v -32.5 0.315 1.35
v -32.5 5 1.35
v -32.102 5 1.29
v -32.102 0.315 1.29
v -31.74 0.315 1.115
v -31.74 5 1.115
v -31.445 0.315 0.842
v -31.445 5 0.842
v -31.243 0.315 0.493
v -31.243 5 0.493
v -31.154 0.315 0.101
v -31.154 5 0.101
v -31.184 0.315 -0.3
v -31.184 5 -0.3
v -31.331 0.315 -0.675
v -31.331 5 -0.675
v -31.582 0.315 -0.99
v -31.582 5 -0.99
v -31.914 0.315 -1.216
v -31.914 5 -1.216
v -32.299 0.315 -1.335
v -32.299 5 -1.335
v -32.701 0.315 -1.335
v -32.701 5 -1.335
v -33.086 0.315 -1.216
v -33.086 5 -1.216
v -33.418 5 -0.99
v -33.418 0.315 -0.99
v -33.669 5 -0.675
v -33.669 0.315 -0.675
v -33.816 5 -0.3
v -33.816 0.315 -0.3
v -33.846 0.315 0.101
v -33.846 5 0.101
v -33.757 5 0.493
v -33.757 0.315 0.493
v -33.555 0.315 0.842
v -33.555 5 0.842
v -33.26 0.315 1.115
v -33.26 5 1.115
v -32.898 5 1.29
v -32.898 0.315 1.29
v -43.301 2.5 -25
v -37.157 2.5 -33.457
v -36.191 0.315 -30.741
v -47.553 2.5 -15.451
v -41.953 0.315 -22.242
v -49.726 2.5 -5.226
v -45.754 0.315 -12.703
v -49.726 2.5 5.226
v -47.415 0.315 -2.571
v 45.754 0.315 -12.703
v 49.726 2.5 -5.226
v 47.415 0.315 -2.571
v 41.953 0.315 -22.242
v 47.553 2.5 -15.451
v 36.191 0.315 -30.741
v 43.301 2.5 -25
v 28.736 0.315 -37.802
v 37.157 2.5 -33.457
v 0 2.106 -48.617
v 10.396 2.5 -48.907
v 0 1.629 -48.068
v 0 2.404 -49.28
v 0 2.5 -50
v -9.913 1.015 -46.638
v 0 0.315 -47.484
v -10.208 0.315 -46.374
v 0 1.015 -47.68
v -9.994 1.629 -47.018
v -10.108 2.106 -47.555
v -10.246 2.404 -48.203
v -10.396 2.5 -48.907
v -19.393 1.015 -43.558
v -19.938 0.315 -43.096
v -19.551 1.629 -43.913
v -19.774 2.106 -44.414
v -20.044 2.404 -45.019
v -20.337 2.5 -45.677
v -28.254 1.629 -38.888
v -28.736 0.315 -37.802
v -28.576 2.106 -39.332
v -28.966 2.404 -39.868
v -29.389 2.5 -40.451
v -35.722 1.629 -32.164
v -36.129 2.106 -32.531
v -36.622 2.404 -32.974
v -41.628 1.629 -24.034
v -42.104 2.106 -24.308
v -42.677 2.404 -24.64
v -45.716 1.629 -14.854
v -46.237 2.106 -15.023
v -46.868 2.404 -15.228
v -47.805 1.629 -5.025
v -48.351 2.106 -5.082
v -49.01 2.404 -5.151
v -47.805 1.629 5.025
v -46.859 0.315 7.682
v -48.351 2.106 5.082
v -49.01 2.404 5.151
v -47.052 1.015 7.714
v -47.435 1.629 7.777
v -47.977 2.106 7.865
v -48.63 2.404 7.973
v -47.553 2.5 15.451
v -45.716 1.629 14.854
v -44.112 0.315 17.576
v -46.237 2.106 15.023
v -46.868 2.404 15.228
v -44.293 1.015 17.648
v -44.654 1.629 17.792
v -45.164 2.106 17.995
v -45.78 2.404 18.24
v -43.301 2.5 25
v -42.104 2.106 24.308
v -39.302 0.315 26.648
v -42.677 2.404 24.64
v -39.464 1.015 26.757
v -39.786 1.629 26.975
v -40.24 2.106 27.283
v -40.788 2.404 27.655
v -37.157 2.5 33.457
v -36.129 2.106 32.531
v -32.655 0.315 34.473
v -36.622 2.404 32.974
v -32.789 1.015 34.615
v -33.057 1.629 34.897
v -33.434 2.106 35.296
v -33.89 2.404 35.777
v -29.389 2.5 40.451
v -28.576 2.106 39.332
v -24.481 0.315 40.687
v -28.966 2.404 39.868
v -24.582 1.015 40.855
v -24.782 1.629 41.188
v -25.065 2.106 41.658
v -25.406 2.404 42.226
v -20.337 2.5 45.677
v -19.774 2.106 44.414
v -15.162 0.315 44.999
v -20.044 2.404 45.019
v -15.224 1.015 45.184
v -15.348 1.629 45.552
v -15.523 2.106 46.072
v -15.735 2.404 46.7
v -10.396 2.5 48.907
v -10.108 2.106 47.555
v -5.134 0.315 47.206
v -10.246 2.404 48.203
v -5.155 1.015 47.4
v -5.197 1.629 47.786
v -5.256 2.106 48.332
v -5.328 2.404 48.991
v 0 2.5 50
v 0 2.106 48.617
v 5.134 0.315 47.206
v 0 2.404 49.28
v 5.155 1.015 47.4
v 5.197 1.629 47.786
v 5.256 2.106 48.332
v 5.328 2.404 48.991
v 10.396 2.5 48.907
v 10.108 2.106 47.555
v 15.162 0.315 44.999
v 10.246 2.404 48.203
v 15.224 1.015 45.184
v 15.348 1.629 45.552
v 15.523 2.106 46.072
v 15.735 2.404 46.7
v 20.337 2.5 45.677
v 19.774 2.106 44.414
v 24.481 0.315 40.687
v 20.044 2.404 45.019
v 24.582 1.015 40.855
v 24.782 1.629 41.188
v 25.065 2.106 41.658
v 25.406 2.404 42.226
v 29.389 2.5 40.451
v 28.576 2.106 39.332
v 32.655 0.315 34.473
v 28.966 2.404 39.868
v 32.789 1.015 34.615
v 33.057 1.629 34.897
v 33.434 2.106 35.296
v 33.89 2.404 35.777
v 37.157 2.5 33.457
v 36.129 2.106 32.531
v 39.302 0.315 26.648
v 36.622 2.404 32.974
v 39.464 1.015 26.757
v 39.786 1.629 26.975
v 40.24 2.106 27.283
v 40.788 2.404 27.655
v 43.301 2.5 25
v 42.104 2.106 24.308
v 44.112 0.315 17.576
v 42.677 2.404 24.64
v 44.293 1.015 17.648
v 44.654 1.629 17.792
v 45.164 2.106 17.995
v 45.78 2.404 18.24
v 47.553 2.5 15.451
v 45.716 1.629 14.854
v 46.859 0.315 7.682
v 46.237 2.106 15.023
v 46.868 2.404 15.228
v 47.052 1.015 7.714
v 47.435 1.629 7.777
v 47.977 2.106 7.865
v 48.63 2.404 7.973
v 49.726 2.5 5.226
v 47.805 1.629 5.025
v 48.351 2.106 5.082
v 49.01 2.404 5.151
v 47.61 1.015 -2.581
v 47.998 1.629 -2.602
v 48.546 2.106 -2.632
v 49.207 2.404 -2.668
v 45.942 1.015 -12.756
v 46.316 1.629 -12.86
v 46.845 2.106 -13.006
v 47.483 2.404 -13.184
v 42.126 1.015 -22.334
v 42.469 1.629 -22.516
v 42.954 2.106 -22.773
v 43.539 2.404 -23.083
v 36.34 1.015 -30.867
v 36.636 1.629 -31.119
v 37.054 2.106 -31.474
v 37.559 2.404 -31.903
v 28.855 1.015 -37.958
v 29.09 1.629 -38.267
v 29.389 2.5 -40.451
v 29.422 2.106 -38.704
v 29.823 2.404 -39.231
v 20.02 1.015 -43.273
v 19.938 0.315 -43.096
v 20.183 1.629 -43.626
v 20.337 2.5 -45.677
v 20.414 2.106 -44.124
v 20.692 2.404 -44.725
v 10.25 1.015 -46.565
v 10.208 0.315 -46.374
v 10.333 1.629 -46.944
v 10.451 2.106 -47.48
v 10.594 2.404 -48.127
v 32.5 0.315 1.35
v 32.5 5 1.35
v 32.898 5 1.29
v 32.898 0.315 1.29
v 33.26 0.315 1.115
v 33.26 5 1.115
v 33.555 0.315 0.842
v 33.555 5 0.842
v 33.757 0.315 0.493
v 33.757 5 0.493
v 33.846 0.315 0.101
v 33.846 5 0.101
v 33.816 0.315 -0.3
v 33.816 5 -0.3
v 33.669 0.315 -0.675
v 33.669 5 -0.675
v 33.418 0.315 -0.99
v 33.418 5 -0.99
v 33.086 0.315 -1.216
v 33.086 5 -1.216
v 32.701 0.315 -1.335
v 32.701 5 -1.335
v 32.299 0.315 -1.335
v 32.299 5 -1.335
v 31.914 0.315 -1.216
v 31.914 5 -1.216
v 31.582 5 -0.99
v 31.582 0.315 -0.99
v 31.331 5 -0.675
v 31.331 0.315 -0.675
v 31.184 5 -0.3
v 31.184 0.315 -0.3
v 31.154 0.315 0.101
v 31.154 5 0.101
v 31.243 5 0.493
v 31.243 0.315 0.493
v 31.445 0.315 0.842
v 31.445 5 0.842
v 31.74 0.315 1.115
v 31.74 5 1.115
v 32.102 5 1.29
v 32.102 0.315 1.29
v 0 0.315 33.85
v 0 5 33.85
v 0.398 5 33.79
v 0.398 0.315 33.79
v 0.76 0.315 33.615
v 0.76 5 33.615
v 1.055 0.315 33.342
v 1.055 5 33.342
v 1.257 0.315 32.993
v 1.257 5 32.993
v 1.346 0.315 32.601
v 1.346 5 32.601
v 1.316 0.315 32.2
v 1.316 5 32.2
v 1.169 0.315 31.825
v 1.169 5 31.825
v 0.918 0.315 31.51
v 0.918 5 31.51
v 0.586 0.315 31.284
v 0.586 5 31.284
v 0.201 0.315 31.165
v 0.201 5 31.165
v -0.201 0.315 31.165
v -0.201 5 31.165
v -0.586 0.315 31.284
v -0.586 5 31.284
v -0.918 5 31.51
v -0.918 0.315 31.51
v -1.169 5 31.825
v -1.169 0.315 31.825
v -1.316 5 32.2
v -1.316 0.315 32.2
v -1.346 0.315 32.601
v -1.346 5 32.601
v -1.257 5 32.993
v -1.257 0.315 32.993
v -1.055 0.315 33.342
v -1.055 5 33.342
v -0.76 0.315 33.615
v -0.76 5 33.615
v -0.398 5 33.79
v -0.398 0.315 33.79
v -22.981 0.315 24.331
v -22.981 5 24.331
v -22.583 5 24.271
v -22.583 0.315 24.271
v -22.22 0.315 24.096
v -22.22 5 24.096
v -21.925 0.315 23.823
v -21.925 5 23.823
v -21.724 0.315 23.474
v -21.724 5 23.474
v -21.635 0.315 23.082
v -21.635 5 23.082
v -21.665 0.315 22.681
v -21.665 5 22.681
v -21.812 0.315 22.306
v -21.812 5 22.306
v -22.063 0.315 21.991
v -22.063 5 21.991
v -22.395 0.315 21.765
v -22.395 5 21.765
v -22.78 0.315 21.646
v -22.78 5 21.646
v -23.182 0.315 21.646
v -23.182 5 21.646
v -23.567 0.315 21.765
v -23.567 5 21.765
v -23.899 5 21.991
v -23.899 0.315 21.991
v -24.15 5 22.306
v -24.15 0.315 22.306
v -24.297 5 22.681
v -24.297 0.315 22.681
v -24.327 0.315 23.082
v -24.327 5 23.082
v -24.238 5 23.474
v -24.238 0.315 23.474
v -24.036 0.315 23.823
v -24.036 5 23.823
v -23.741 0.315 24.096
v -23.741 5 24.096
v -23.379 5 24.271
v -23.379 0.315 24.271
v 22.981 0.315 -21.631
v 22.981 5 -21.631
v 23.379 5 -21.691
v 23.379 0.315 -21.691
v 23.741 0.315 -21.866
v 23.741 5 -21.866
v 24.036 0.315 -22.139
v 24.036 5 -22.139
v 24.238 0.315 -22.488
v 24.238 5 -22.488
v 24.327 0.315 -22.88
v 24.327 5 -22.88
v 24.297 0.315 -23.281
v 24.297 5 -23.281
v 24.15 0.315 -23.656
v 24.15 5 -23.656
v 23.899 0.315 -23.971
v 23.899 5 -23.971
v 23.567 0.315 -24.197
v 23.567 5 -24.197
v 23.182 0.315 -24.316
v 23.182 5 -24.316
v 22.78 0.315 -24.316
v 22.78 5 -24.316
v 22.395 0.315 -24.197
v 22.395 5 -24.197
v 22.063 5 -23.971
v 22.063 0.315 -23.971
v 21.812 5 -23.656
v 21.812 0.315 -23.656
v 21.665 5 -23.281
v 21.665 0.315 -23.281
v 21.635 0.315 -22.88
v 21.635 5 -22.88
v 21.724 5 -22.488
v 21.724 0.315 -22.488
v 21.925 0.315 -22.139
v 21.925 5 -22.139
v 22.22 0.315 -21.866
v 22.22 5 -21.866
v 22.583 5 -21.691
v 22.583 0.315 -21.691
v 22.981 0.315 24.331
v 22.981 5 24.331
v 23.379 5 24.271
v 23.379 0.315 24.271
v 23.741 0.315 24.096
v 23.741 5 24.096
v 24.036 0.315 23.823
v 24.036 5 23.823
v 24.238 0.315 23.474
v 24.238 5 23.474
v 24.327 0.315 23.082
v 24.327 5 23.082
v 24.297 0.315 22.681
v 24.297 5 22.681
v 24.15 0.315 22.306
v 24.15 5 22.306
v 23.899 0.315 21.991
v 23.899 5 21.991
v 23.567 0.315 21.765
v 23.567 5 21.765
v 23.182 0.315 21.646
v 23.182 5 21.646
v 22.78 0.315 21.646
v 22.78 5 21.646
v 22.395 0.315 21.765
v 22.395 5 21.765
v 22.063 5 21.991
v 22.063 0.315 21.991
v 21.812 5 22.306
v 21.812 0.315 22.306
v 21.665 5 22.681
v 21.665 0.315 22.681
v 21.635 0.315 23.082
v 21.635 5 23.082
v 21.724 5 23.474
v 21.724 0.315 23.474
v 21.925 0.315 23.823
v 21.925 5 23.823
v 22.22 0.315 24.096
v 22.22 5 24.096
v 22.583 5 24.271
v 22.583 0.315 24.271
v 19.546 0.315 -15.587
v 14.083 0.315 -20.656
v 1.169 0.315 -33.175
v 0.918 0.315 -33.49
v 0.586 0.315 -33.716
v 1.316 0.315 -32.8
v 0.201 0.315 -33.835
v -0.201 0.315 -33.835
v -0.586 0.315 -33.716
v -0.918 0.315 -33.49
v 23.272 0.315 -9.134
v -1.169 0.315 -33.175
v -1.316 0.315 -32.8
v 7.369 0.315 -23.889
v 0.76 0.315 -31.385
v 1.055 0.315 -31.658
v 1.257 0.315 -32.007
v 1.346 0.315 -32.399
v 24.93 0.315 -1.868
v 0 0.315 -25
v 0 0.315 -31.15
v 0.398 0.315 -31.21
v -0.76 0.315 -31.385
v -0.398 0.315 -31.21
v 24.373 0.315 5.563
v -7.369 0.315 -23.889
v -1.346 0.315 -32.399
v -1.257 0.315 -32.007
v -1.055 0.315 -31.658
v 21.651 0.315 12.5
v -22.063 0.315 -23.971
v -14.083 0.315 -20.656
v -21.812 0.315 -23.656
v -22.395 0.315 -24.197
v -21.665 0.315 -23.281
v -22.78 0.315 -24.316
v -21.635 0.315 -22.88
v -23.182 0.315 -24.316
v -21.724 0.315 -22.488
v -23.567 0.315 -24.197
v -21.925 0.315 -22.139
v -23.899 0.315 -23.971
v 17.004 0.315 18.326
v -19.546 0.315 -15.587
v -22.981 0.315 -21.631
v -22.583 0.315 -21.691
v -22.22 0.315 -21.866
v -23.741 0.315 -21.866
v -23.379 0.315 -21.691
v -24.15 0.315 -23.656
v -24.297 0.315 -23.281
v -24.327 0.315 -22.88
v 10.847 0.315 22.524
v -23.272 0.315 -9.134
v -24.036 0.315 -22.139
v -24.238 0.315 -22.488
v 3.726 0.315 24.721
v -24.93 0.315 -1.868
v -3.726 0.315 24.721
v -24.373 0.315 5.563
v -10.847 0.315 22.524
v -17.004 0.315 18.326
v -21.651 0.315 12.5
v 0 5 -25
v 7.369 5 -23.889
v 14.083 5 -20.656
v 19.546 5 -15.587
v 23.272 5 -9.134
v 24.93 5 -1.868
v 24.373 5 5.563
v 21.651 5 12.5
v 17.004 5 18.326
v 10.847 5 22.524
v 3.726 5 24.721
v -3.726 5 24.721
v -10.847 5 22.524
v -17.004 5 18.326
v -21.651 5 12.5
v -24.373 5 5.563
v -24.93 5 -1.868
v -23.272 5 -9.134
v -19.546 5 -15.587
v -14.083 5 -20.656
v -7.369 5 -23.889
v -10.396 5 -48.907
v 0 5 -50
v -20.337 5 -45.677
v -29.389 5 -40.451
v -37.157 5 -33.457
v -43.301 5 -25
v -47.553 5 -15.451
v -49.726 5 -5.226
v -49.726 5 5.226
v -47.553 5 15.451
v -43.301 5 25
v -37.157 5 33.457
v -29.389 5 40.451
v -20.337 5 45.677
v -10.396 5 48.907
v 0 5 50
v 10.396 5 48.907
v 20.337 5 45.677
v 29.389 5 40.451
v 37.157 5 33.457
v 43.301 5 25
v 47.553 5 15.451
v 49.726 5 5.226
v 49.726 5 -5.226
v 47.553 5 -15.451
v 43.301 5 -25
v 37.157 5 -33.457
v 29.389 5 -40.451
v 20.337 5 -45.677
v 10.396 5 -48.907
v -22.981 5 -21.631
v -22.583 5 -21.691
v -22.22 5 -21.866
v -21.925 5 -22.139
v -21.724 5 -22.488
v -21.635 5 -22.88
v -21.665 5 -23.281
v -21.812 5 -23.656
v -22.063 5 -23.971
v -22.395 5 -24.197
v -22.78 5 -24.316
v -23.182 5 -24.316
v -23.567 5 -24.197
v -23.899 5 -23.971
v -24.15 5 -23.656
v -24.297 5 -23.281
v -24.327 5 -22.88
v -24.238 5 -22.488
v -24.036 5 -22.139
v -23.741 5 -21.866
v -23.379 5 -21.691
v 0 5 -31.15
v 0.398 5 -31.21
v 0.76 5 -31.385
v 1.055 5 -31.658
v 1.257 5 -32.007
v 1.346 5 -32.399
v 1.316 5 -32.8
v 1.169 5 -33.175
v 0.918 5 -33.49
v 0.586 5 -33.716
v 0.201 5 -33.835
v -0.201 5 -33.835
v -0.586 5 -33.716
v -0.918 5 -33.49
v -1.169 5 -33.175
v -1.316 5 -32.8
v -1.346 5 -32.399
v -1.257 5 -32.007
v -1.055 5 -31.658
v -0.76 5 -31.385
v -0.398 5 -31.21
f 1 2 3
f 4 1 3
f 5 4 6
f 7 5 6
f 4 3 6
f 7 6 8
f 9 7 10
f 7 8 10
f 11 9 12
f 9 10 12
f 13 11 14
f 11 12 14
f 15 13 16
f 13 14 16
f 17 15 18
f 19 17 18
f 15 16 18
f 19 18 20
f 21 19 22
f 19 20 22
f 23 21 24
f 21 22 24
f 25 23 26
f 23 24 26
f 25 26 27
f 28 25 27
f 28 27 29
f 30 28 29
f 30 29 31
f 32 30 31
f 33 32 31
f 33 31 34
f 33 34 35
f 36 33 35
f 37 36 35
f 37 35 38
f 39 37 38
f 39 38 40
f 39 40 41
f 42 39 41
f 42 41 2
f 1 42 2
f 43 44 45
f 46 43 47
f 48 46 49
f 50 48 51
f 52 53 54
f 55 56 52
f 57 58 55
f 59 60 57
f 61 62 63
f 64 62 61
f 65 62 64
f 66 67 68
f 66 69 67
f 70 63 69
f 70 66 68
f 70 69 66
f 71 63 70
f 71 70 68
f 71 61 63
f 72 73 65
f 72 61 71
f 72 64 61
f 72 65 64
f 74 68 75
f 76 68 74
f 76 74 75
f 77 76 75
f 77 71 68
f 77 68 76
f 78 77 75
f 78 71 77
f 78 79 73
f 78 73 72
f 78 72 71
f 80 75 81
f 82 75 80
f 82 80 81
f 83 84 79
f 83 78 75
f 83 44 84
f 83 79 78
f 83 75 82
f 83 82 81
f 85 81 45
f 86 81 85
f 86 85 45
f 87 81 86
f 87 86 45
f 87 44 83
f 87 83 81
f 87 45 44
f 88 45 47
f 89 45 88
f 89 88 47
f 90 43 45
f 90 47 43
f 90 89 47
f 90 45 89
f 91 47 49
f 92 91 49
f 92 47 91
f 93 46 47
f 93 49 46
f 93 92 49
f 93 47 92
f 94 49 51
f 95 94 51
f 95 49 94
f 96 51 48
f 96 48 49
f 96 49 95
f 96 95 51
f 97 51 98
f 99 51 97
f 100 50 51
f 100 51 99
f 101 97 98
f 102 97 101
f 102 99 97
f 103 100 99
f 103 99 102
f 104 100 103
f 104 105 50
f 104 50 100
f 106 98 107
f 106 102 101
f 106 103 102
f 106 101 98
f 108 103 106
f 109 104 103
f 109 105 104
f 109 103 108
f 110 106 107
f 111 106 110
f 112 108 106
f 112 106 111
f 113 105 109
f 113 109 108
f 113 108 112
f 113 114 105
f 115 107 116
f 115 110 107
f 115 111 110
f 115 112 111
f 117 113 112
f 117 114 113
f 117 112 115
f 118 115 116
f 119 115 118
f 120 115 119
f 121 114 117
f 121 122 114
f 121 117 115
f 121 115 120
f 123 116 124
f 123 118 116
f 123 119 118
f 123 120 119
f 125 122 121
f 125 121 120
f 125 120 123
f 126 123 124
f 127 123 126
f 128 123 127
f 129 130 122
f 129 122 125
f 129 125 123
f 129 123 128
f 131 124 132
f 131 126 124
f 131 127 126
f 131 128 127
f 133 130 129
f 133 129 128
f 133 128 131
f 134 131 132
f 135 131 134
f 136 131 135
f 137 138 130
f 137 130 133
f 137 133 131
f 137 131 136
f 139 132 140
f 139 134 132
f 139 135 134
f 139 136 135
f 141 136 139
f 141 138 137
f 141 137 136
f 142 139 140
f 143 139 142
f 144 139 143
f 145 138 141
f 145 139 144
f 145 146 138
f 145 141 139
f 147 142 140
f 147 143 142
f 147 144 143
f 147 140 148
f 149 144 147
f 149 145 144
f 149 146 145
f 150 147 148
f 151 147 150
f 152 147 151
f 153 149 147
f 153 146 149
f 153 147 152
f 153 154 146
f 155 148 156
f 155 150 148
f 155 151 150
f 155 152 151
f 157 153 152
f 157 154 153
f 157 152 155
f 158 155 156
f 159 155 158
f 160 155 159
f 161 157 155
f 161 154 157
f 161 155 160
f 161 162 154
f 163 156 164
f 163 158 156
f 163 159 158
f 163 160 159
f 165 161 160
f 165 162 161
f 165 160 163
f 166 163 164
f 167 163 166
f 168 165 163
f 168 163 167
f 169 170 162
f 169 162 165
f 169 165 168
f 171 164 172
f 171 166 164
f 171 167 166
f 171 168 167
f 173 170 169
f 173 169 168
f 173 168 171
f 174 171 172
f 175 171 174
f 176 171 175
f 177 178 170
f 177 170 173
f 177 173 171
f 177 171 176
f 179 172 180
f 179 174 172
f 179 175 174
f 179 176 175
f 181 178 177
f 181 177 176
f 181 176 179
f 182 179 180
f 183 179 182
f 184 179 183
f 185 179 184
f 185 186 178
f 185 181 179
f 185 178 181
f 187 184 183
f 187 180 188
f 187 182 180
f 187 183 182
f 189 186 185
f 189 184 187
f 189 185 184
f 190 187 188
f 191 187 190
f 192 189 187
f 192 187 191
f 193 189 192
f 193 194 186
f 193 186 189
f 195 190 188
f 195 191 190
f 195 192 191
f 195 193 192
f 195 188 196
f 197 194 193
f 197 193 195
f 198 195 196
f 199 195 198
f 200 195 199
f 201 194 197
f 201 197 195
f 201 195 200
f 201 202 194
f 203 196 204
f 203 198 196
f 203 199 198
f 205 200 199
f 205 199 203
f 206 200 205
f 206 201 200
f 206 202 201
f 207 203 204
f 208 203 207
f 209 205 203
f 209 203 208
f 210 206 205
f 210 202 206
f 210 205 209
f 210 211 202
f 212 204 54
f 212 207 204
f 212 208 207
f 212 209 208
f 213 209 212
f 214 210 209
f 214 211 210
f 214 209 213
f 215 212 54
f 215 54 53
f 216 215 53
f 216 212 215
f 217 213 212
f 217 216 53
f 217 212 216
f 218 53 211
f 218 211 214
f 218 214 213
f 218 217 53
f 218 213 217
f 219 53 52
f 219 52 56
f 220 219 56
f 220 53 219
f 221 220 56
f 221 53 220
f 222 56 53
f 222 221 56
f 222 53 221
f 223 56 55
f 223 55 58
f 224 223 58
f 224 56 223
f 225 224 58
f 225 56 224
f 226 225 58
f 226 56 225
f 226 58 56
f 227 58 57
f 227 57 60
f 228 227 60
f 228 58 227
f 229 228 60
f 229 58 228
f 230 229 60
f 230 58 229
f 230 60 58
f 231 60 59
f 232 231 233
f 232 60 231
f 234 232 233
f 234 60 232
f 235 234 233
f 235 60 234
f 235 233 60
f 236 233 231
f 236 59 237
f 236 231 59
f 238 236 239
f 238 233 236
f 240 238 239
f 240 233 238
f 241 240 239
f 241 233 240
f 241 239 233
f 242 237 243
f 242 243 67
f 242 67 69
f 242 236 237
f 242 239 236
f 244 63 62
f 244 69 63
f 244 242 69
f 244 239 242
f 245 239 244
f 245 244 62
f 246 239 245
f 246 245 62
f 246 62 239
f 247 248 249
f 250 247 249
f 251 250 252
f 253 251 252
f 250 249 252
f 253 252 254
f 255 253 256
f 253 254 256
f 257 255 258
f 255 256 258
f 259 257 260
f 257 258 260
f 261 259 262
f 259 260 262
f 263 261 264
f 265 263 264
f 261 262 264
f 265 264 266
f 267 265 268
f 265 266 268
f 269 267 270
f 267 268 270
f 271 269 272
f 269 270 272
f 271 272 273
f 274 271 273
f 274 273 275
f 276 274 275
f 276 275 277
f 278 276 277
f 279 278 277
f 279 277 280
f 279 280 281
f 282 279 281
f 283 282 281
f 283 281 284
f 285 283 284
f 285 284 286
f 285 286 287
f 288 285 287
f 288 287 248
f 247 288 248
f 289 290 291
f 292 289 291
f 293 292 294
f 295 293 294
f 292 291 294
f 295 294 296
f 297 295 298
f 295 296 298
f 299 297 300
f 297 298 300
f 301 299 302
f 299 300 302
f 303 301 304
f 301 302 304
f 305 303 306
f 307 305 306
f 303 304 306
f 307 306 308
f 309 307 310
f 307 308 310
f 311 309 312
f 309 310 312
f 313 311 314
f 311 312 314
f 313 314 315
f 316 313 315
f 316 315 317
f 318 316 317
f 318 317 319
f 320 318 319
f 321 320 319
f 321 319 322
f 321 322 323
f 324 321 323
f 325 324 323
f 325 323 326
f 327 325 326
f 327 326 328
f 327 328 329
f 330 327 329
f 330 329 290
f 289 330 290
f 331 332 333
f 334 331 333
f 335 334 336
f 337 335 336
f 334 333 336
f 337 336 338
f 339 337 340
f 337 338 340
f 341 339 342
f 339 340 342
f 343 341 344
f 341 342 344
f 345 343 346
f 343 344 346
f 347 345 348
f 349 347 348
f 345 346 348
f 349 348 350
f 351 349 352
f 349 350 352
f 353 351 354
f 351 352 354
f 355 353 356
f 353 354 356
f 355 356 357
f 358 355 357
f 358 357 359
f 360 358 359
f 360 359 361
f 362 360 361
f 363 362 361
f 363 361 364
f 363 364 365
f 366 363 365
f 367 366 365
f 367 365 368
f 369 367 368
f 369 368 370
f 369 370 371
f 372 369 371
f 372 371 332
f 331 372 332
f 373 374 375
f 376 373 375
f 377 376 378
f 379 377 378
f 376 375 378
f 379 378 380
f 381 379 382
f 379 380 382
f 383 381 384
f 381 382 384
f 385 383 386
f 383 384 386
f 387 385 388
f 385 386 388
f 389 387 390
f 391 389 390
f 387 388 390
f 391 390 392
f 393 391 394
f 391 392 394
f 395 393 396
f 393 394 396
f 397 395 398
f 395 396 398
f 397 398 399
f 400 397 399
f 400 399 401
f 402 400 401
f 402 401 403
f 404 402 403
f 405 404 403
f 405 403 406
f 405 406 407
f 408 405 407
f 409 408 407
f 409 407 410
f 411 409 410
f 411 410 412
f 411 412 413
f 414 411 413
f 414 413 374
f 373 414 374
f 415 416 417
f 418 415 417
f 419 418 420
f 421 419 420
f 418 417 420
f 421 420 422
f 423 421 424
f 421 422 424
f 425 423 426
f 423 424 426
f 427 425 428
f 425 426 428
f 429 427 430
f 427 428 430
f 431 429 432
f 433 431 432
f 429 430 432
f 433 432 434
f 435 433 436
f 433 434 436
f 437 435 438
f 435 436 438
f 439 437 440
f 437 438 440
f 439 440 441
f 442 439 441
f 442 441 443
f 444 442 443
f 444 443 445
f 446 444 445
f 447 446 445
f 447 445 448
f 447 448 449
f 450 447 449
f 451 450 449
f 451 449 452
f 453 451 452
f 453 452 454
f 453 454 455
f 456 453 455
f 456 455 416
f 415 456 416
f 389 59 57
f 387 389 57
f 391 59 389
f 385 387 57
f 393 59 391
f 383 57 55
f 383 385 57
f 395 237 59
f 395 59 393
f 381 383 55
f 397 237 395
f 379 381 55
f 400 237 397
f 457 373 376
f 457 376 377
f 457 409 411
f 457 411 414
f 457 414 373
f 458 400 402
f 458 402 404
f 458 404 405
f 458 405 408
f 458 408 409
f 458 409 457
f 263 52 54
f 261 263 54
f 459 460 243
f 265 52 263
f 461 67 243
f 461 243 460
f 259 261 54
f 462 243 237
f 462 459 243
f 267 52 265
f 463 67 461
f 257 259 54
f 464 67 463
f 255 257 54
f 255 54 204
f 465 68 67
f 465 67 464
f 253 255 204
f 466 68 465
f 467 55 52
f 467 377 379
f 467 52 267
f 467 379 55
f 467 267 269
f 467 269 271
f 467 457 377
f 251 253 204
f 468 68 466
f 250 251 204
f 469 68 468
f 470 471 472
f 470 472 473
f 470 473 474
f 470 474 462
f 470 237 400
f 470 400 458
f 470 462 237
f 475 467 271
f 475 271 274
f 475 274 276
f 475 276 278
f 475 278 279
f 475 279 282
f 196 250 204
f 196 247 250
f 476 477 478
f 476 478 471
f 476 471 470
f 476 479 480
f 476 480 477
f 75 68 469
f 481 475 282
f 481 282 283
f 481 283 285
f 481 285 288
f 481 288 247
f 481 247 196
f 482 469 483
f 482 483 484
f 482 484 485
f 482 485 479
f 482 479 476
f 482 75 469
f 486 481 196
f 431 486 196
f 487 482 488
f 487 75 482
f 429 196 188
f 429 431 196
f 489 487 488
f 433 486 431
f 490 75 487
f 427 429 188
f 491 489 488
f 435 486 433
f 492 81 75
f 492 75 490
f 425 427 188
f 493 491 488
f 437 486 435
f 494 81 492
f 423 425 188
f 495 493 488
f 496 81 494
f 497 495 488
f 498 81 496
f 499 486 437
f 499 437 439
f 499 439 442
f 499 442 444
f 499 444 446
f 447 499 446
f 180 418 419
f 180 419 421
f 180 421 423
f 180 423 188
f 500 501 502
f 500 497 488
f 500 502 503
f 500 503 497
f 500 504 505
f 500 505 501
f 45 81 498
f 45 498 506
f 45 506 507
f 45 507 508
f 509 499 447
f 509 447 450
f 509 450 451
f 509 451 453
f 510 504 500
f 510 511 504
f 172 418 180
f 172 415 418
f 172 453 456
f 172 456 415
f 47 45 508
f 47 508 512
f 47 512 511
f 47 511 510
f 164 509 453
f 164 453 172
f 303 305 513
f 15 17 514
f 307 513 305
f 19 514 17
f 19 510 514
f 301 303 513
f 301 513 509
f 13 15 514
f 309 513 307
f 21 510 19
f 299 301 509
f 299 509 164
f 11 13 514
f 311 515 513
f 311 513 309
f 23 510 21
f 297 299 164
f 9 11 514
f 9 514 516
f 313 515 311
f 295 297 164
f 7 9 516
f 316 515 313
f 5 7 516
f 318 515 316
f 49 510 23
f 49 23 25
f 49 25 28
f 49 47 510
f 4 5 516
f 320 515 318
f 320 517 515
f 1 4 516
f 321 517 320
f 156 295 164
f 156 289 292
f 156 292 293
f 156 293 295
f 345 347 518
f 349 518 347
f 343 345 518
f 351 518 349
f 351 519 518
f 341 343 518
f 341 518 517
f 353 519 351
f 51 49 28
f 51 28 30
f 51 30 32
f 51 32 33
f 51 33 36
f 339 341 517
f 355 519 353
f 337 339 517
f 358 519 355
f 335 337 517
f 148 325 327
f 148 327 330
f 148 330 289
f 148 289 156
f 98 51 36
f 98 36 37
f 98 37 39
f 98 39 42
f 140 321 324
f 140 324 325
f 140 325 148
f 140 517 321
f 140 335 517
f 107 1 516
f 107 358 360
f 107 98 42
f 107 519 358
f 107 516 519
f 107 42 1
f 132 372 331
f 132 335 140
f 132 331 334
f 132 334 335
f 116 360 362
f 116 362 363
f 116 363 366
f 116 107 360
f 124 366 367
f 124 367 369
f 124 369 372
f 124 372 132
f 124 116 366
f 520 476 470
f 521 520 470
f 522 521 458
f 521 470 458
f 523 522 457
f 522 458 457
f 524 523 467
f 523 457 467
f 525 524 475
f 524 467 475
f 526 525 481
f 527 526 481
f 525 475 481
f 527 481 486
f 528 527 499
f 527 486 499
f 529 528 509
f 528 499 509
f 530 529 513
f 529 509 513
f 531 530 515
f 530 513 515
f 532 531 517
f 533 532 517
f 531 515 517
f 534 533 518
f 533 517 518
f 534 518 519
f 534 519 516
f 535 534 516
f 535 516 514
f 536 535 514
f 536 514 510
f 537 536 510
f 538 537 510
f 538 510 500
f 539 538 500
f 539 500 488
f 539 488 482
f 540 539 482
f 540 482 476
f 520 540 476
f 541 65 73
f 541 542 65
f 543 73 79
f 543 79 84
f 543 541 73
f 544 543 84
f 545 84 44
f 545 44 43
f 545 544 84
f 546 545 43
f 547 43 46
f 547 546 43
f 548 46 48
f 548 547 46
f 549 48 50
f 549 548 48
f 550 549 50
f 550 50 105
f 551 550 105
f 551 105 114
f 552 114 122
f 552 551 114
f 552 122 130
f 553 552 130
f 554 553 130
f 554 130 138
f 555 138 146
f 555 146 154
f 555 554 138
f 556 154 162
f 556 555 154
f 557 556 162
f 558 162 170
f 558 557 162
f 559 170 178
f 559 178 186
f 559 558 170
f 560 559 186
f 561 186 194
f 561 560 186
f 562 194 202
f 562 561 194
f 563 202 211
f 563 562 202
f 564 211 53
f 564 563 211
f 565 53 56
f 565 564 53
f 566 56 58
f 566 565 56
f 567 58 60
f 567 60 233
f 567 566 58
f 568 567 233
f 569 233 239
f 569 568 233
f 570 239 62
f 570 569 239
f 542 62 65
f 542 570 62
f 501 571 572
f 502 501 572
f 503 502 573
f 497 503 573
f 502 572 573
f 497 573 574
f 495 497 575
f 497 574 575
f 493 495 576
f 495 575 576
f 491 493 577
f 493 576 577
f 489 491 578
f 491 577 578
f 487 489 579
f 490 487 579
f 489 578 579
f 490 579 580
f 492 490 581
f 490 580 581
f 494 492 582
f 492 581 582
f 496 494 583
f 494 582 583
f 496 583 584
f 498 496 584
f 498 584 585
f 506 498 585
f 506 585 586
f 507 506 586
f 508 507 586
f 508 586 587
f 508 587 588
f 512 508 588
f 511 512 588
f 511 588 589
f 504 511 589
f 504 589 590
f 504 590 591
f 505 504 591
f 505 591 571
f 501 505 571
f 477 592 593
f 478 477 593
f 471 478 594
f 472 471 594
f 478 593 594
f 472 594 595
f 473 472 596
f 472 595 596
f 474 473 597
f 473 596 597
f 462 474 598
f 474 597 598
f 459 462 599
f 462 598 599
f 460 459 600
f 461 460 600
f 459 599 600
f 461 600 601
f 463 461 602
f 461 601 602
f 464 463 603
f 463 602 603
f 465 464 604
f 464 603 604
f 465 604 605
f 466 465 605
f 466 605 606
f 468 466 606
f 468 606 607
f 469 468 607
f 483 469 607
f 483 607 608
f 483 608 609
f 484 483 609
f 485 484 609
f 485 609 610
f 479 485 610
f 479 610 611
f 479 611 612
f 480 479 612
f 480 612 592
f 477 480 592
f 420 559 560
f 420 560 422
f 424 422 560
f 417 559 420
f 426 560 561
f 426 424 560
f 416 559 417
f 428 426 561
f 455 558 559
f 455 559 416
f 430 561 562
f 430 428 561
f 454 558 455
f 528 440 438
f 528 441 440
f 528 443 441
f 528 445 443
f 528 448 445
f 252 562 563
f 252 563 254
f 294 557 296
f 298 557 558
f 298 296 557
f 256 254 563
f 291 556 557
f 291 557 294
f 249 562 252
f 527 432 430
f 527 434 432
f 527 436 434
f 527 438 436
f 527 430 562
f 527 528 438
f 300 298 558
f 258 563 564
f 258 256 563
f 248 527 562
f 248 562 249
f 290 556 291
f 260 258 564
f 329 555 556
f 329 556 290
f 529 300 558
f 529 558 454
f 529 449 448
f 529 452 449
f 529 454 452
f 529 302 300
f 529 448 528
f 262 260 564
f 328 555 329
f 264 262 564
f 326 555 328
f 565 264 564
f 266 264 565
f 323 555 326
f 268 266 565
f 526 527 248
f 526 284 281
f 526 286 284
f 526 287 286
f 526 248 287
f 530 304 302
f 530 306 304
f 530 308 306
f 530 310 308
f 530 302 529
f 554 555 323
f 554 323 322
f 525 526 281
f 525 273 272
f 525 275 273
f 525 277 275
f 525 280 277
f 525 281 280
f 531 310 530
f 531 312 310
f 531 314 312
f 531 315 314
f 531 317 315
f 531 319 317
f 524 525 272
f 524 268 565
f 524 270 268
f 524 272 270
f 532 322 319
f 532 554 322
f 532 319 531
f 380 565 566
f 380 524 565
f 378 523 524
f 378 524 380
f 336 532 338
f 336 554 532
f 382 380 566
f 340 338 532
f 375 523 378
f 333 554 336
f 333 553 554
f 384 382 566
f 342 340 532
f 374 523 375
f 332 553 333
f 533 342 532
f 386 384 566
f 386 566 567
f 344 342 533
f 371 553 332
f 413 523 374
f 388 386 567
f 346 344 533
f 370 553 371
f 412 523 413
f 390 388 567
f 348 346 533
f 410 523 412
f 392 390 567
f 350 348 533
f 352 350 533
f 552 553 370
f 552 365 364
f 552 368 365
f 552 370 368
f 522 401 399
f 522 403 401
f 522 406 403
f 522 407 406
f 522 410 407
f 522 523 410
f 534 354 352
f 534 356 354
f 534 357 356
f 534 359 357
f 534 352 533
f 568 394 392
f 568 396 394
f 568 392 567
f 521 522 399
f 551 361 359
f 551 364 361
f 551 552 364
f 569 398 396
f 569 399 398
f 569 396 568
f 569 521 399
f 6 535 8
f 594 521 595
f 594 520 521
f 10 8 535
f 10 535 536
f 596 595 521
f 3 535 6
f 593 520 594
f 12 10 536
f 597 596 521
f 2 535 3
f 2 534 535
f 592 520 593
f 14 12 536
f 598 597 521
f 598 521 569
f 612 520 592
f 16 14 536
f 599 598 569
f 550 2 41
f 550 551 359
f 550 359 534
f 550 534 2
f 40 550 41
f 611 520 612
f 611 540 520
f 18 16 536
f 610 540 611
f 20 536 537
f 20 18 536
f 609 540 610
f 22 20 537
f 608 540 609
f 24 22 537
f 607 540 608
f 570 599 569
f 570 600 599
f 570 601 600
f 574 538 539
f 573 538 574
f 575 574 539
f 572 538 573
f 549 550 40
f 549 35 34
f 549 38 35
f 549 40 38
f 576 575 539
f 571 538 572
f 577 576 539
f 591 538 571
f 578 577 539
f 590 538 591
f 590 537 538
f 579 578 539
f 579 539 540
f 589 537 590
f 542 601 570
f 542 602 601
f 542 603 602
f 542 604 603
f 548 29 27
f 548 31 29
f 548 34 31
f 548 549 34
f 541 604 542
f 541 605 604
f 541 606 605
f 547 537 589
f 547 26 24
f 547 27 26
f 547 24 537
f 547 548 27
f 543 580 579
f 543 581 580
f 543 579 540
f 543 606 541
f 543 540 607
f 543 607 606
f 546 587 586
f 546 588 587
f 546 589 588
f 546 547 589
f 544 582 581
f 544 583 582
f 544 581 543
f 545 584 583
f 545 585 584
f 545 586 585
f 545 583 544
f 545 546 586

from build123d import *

# Parameters (mm, degrees)
SKETCH2_R          = 1.35
CUT_EXTRUDE1_DEPTH = 71.865707448
SKETCH4_R          = 25
CUT_EXTRUDE2_DEPTH = 71.865707448


with BuildPart() as part:
    # Sketch1 → Revolve1 (revolve)
    with BuildSketch(Plane.XY, mode=Mode.PRIVATE) as revolve1_sk:
        with BuildLine():
            Line((0, 0.315015275), (-47.48443706, 0.315015275))
            ThreePointArc((-47.48443706, 0.315015275), (-48.325204531, 1.887561025), (-50, 2.499811149))
            Line((-50, 2.499811149), (-50, 4.999937053))
            Line((-50, 4.999937053), (0, 4.999937053))
            Line((0, 4.999937053), (0, 0.315015275))
        make_face()
    revolve(revolve1_sk.sketch.rotate(Axis((0, 0.315015275, 0), (0, 1, 0)), 270), axis=Axis((0, 0.315015275, 0), (0, 1, 0)))

    # Sketch2 → Cut-Extrude1 (cut, through all)
    with BuildSketch(Plane(origin=(0, 4.999937053, 0), x_dir=(1, 0, 0), z_dir=(0, 1, 0))):
        with Locations(Location((0, 32.5, 0), (0, 0, 270))):
            Circle(SKETCH2_R)
        with Locations(Location((22.980970389, 22.980970389, 0), (0, 0, 270))):
            Circle(SKETCH2_R)
        with Locations(Location((32.5, 0, 0), (0, 0, 270))):
            Circle(SKETCH2_R)
        with Locations(Location((22.980970389, -22.980970389, 0), (0, 0, 270))):
            Circle(SKETCH2_R)
        with Locations(Location((0, -32.5, 0), (0, 0, 270))):
            Circle(SKETCH2_R)
        with Locations(Location((-22.980970389, -22.980970389, 0), (0, 0, 270))):
            Circle(SKETCH2_R)
        with Locations(Location((-32.5, 0, 0), (0, 0, 270))):
            Circle(SKETCH2_R)
        with Locations(Location((-22.980970389, 22.980970389, 0), (0, 0, 270))):
            Circle(SKETCH2_R)
    extrude(amount=-CUT_EXTRUDE1_DEPTH, mode=Mode.SUBTRACT)

    # Sketch4 → Cut-Extrude2 (cut, through all)
    with BuildSketch(Plane.XZ.offset(-0.315015275)):
        with Locations(Location((0, 0, 0), (0, 0, 270))):
            Circle(SKETCH4_R)
    extrude(amount=-CUT_EXTRUDE2_DEPTH, mode=Mode.SUBTRACT)


solid = part.part
